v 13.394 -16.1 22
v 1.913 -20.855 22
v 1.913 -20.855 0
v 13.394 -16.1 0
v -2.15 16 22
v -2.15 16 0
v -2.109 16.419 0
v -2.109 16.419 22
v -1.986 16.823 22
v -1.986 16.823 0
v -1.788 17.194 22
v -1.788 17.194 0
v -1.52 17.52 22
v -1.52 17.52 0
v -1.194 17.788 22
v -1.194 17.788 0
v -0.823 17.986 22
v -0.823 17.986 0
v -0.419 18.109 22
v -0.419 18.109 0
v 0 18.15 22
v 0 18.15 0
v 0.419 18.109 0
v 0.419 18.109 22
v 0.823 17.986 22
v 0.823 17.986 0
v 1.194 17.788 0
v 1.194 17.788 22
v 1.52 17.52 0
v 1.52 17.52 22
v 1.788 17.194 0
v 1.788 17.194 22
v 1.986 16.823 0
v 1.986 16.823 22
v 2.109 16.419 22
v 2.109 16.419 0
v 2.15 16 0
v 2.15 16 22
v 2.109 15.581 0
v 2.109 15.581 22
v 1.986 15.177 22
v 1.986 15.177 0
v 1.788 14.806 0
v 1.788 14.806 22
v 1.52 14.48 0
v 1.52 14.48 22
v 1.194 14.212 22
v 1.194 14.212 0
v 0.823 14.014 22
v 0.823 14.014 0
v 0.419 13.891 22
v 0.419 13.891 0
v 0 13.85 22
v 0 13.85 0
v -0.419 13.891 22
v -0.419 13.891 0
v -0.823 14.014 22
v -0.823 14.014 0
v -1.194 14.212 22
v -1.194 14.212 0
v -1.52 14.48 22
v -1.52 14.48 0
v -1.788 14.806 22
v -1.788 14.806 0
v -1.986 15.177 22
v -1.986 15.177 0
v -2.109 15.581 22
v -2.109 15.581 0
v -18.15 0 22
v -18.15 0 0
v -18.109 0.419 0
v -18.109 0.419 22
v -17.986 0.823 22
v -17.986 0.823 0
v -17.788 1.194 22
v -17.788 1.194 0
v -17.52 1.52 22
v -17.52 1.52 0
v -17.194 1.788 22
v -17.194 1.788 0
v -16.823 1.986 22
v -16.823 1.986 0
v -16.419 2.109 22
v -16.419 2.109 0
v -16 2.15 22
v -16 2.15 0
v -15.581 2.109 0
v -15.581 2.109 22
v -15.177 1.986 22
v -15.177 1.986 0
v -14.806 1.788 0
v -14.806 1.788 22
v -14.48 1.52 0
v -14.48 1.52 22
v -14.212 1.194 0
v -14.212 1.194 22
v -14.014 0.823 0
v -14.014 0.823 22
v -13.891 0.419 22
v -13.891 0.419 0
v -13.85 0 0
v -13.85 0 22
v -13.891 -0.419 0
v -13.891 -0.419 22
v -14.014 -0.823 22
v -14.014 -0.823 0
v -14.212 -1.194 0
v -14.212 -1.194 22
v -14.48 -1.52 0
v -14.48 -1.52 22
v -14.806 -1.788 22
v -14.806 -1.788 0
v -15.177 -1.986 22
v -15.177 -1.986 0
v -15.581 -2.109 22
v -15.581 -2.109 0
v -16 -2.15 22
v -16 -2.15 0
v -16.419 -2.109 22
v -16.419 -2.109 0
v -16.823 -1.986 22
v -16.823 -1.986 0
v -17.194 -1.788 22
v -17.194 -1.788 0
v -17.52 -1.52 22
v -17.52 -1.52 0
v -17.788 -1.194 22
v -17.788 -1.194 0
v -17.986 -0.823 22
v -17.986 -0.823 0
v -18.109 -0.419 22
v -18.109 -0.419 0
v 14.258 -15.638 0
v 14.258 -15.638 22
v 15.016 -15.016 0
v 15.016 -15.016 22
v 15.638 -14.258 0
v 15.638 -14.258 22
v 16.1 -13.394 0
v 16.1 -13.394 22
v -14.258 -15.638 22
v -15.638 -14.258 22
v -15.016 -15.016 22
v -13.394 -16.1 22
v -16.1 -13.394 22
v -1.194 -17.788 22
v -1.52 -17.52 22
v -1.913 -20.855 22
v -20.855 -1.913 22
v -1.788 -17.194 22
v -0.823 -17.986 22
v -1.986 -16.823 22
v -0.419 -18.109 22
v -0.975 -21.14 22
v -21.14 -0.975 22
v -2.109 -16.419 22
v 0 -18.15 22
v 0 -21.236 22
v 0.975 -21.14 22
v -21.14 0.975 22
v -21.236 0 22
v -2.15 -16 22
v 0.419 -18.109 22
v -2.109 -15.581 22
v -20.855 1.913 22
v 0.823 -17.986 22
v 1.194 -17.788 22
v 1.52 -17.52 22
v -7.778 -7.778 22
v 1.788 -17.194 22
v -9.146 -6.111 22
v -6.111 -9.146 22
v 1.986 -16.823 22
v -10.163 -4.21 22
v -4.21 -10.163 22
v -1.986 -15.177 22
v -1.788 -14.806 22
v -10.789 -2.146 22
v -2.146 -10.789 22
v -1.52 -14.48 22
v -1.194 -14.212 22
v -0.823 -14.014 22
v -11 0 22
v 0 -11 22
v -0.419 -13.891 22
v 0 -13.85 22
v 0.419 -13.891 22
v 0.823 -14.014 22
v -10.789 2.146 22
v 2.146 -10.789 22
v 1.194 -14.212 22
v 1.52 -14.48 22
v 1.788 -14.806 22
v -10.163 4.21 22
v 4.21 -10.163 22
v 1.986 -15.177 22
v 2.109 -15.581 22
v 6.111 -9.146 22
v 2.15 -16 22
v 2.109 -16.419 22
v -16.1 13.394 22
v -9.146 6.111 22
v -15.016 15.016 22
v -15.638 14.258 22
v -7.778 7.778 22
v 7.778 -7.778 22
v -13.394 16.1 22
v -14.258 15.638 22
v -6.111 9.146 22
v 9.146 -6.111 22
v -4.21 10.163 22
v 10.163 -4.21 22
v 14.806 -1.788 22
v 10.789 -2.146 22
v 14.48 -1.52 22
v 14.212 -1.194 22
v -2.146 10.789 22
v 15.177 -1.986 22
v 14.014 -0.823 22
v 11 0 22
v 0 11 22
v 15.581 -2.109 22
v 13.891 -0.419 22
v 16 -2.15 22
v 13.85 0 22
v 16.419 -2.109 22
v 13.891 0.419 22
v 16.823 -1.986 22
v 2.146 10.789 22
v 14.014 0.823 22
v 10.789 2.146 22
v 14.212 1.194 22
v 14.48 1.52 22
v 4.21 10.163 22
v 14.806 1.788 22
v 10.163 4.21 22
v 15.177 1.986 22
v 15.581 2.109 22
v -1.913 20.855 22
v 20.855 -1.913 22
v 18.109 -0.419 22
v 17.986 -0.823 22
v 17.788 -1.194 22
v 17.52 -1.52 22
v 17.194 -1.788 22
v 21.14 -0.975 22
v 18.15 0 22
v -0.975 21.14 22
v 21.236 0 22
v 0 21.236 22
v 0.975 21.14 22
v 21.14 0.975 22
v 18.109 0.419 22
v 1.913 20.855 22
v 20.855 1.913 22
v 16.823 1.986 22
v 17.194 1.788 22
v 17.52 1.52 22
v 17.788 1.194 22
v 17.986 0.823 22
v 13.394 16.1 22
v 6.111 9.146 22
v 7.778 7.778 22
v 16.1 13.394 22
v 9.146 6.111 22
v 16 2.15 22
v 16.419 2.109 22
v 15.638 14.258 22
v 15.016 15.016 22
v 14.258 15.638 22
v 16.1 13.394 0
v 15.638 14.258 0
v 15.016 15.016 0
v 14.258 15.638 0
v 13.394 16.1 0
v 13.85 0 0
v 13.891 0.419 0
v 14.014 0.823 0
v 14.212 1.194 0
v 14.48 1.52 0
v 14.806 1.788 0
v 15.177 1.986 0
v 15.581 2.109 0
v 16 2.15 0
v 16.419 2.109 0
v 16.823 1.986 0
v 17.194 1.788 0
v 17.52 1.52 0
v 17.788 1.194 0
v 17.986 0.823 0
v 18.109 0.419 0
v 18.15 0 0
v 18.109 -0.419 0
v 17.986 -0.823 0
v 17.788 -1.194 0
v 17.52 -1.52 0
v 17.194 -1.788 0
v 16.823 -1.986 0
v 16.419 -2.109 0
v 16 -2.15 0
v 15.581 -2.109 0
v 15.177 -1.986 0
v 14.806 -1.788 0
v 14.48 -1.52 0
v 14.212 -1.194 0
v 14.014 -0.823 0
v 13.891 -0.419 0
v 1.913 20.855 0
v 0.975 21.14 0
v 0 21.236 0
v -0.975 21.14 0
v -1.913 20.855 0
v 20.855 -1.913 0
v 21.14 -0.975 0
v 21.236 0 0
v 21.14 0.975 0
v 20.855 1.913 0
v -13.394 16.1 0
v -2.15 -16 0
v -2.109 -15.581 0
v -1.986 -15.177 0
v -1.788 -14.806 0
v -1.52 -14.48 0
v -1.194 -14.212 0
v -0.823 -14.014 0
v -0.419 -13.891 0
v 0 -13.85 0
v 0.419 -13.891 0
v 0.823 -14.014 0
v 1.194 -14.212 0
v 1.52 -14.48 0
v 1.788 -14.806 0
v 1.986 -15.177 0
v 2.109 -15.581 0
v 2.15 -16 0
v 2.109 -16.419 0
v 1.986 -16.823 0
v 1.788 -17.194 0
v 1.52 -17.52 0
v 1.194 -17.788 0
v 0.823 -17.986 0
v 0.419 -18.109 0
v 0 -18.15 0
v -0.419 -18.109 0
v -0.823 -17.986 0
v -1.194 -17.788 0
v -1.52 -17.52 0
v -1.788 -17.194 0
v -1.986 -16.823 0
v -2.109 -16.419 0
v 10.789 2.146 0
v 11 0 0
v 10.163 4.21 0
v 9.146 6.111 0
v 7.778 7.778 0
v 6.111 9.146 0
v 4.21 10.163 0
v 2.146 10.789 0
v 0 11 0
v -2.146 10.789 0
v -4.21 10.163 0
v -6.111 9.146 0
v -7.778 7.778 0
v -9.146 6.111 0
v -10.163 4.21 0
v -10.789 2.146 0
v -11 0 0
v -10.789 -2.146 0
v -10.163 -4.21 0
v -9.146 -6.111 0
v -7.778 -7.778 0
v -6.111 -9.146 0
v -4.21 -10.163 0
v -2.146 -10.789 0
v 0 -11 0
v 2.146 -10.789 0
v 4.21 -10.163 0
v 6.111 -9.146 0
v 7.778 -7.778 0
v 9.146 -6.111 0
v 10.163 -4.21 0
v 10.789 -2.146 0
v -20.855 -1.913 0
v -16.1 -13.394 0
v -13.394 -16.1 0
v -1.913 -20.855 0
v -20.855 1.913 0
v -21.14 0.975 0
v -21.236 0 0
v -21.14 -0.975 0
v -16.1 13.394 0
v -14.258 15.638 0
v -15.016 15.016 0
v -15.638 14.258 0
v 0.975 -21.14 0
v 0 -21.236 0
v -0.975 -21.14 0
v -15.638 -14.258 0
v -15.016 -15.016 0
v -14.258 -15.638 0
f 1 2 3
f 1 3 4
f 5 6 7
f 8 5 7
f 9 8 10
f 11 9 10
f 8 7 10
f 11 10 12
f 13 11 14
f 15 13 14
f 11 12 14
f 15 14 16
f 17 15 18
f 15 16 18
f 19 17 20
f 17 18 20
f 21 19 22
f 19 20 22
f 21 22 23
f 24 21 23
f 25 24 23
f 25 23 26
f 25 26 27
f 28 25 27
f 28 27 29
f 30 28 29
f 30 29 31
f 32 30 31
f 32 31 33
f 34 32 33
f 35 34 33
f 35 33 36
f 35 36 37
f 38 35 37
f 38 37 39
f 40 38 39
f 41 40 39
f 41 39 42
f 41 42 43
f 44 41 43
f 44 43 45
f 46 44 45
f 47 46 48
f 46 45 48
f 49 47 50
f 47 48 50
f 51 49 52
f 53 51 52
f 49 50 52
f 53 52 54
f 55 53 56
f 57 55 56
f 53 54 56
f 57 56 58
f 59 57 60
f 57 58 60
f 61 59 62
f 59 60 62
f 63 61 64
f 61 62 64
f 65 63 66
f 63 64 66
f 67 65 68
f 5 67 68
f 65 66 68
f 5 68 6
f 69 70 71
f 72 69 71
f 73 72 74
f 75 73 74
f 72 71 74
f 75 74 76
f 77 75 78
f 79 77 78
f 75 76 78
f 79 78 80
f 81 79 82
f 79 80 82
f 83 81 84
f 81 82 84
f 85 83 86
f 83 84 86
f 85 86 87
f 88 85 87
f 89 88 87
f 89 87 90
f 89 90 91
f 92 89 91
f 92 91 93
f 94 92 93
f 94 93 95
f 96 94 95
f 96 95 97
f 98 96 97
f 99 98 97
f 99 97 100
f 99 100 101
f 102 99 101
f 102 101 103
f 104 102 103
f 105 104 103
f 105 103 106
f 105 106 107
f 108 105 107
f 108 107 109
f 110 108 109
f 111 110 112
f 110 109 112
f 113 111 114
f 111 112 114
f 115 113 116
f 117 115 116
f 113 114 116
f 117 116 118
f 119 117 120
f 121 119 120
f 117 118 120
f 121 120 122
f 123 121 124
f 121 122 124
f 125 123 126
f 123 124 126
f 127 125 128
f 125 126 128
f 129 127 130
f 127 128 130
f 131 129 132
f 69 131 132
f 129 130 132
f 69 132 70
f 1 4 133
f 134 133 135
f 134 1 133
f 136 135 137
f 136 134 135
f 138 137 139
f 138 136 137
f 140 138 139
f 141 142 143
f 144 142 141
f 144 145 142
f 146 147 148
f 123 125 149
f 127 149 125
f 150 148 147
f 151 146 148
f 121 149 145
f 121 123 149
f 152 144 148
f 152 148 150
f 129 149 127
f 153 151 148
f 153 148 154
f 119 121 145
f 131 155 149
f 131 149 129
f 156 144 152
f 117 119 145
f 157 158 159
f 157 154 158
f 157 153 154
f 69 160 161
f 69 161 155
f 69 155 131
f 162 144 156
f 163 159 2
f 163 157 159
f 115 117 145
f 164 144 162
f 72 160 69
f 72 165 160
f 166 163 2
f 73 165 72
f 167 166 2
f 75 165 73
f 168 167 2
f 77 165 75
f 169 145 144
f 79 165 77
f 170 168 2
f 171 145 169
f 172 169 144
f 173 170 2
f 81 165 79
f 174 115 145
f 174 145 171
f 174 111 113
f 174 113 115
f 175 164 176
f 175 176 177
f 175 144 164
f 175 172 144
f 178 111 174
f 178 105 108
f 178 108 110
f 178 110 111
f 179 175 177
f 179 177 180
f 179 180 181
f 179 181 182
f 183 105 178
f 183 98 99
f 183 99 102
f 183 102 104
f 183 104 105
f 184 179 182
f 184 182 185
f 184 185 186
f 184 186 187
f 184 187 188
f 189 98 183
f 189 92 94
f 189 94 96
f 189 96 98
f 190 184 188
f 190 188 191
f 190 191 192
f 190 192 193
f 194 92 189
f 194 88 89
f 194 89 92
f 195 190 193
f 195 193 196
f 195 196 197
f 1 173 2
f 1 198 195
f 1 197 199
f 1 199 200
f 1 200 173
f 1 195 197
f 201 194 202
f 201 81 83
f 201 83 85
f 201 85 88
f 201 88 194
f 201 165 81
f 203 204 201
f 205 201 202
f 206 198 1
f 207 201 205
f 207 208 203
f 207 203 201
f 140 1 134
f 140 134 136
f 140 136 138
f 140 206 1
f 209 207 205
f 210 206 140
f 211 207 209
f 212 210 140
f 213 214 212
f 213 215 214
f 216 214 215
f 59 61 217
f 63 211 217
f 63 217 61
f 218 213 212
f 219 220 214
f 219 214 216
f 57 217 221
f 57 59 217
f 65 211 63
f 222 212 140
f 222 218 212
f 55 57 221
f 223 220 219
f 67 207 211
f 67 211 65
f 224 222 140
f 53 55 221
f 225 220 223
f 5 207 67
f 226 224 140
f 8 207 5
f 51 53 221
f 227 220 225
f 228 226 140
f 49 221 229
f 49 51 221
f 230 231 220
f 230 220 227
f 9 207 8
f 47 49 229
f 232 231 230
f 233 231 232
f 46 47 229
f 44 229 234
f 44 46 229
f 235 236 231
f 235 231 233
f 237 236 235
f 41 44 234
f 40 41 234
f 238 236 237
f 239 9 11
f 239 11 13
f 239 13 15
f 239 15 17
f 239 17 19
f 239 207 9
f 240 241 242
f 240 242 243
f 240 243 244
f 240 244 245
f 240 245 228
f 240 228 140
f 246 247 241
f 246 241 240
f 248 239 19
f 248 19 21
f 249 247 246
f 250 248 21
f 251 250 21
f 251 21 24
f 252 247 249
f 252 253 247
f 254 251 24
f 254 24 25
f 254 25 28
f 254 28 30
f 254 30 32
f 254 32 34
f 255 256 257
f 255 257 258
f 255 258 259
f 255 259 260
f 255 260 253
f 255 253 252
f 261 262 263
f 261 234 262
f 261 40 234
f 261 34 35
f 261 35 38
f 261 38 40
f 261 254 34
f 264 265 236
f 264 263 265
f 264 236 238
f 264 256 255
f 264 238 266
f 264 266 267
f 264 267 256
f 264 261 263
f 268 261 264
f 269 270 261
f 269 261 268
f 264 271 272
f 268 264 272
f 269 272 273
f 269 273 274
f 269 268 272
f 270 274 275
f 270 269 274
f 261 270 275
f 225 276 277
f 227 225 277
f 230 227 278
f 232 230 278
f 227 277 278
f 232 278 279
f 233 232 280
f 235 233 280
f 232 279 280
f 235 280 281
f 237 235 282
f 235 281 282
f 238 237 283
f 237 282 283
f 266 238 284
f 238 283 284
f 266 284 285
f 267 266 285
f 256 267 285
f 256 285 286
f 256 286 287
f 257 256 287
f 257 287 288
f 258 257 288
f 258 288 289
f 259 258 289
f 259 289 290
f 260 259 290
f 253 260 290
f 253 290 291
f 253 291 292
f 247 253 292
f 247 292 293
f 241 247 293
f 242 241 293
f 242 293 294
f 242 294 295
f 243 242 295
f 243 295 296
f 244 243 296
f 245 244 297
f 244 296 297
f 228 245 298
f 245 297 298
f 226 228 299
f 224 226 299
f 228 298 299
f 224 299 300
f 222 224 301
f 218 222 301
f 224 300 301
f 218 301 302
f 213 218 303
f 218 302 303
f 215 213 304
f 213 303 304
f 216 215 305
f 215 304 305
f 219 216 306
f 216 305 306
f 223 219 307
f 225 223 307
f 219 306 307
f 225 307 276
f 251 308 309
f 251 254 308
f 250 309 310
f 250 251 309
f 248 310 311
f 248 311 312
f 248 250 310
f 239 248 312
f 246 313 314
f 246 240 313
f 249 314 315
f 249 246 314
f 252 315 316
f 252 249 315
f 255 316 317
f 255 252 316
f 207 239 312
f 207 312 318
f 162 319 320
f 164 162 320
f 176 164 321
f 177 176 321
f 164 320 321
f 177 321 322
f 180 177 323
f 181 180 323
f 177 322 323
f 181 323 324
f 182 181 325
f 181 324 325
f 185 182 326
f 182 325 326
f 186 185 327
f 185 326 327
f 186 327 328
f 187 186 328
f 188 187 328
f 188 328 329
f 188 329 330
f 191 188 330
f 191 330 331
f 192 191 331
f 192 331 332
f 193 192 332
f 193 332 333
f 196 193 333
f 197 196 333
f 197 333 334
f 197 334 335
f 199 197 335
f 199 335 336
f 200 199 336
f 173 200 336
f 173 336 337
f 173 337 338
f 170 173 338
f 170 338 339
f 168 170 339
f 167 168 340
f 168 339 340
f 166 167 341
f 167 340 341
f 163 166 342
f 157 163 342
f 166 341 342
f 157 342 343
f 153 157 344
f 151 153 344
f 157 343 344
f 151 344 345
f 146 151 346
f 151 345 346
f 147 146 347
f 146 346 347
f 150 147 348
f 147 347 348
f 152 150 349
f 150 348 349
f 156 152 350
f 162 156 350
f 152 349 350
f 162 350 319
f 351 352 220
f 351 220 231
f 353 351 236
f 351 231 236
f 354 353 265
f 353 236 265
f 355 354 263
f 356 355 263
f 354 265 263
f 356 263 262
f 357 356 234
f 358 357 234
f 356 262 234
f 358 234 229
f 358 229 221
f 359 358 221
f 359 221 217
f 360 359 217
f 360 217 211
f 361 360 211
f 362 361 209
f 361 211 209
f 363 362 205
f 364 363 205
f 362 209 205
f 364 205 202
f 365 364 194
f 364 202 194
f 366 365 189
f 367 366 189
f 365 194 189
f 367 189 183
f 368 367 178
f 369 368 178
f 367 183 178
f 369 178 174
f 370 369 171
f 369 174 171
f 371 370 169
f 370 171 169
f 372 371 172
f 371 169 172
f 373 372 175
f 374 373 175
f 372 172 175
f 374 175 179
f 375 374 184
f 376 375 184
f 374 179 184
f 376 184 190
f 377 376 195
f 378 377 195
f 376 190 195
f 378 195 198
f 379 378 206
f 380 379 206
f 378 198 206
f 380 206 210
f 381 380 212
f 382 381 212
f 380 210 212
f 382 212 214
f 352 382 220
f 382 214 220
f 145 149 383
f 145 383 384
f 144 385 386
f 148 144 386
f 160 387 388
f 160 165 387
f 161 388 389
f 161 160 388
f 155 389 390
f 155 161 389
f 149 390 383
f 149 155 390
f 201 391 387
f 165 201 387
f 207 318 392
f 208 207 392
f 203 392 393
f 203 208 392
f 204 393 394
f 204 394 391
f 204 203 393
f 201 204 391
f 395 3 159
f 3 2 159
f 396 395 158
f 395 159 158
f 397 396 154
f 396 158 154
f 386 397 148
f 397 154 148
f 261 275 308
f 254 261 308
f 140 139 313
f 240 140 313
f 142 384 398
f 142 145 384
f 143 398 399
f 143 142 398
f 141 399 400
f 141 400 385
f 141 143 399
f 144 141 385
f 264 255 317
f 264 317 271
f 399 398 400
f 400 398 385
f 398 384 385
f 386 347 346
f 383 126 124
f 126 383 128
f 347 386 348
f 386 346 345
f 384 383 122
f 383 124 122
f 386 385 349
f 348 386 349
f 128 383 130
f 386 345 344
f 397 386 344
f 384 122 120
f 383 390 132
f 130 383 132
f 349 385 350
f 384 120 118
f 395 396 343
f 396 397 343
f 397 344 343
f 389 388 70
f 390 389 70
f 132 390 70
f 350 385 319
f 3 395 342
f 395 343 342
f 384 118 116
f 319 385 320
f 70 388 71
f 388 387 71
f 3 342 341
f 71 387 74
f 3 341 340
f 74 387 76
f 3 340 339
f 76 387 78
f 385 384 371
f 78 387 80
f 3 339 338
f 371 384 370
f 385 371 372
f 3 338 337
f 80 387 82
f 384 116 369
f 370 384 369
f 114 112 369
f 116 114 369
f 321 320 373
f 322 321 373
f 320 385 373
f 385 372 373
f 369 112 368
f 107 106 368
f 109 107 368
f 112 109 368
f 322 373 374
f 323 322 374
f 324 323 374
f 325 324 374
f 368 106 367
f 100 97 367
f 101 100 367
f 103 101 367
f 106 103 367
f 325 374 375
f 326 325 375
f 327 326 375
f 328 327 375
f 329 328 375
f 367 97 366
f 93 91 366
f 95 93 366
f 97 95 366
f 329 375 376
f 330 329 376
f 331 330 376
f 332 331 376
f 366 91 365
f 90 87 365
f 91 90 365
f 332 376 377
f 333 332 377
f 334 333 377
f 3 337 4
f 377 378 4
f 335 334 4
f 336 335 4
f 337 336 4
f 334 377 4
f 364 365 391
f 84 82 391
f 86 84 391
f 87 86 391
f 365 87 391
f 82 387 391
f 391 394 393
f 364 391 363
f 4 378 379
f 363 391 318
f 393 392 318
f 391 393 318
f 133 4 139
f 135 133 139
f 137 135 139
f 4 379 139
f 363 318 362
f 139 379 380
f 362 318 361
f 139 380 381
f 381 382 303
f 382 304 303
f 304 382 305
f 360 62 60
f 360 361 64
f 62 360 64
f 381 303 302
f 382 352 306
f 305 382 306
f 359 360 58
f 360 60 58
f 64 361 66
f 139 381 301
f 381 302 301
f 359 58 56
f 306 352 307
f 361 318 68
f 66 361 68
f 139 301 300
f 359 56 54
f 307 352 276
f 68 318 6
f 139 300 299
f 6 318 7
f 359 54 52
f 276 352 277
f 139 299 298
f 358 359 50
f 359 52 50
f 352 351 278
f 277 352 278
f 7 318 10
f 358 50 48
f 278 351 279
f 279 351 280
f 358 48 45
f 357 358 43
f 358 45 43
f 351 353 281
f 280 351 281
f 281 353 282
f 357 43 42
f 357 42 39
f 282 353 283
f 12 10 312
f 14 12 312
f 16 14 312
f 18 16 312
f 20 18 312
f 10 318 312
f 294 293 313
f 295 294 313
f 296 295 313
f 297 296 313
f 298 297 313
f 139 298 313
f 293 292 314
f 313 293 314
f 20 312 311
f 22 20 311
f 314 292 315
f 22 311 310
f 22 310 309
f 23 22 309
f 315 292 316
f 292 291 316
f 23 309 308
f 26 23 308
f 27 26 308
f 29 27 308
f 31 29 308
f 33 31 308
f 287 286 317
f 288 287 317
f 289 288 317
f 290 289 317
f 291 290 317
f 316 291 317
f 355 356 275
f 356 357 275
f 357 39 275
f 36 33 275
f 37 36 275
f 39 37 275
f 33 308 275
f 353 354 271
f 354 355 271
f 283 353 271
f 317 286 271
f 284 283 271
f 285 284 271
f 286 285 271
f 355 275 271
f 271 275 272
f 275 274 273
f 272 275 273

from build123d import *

# Parameters (mm, degrees)
BOSS_EXTRUDE1_DEPTH  = 22
FILLET1_R            = 5
M4_CLEARANCE_HOLE1_D = 4.3
SKETCH5_R            = 11
CUT_EXTRUDE1_DEPTH   = 22


with BuildPart() as part:
    # Sketch1 → Boss-Extrude1 (new body)
    with BuildSketch(Plane.XY):
        Polygon((0, -21.647844006), (15.307337295, -15.307337295), (21.647844006, 0), (15.307337295, 15.307337295), (0, 21.647844006), (-15.307337295, 15.307337295), (-21.647844006, 0), (-15.307337295, -15.307337295), align=None)
    extrude(amount=BOSS_EXTRUDE1_DEPTH)

    # Fillet1
    fillet1_edges = [part.edges().sort_by_distance(p)[0] for p in [
        (15.307337295, -15.307337295, 11),
        (0, -21.647844006, 11),
        (-15.307337295, -15.307337295, 11),
        (-21.647844006, 0, 11),
        (-15.307337295, 15.307337295, 11),
        (0, 21.647844006, 11),
        (15.307337295, 15.307337295, 11),
        (21.647844006, 0, 11),
    ]]
    fillet(fillet1_edges, radius=FILLET1_R)

    # M4 Clearance Hole1 (through all)
    with Locations(Plane.XY.offset(22)):
        with Locations((0, 16), (16, 0), (0, -16), (-16, 0)):
            Hole(M4_CLEARANCE_HOLE1_D / 2)

    # Sketch5 → Cut-Extrude1 (cut)
    with BuildSketch(Plane.XY.offset(22)):
        Circle(SKETCH5_R)
    extrude(amount=-CUT_EXTRUDE1_DEPTH, mode=Mode.SUBTRACT)


solid = part.part
